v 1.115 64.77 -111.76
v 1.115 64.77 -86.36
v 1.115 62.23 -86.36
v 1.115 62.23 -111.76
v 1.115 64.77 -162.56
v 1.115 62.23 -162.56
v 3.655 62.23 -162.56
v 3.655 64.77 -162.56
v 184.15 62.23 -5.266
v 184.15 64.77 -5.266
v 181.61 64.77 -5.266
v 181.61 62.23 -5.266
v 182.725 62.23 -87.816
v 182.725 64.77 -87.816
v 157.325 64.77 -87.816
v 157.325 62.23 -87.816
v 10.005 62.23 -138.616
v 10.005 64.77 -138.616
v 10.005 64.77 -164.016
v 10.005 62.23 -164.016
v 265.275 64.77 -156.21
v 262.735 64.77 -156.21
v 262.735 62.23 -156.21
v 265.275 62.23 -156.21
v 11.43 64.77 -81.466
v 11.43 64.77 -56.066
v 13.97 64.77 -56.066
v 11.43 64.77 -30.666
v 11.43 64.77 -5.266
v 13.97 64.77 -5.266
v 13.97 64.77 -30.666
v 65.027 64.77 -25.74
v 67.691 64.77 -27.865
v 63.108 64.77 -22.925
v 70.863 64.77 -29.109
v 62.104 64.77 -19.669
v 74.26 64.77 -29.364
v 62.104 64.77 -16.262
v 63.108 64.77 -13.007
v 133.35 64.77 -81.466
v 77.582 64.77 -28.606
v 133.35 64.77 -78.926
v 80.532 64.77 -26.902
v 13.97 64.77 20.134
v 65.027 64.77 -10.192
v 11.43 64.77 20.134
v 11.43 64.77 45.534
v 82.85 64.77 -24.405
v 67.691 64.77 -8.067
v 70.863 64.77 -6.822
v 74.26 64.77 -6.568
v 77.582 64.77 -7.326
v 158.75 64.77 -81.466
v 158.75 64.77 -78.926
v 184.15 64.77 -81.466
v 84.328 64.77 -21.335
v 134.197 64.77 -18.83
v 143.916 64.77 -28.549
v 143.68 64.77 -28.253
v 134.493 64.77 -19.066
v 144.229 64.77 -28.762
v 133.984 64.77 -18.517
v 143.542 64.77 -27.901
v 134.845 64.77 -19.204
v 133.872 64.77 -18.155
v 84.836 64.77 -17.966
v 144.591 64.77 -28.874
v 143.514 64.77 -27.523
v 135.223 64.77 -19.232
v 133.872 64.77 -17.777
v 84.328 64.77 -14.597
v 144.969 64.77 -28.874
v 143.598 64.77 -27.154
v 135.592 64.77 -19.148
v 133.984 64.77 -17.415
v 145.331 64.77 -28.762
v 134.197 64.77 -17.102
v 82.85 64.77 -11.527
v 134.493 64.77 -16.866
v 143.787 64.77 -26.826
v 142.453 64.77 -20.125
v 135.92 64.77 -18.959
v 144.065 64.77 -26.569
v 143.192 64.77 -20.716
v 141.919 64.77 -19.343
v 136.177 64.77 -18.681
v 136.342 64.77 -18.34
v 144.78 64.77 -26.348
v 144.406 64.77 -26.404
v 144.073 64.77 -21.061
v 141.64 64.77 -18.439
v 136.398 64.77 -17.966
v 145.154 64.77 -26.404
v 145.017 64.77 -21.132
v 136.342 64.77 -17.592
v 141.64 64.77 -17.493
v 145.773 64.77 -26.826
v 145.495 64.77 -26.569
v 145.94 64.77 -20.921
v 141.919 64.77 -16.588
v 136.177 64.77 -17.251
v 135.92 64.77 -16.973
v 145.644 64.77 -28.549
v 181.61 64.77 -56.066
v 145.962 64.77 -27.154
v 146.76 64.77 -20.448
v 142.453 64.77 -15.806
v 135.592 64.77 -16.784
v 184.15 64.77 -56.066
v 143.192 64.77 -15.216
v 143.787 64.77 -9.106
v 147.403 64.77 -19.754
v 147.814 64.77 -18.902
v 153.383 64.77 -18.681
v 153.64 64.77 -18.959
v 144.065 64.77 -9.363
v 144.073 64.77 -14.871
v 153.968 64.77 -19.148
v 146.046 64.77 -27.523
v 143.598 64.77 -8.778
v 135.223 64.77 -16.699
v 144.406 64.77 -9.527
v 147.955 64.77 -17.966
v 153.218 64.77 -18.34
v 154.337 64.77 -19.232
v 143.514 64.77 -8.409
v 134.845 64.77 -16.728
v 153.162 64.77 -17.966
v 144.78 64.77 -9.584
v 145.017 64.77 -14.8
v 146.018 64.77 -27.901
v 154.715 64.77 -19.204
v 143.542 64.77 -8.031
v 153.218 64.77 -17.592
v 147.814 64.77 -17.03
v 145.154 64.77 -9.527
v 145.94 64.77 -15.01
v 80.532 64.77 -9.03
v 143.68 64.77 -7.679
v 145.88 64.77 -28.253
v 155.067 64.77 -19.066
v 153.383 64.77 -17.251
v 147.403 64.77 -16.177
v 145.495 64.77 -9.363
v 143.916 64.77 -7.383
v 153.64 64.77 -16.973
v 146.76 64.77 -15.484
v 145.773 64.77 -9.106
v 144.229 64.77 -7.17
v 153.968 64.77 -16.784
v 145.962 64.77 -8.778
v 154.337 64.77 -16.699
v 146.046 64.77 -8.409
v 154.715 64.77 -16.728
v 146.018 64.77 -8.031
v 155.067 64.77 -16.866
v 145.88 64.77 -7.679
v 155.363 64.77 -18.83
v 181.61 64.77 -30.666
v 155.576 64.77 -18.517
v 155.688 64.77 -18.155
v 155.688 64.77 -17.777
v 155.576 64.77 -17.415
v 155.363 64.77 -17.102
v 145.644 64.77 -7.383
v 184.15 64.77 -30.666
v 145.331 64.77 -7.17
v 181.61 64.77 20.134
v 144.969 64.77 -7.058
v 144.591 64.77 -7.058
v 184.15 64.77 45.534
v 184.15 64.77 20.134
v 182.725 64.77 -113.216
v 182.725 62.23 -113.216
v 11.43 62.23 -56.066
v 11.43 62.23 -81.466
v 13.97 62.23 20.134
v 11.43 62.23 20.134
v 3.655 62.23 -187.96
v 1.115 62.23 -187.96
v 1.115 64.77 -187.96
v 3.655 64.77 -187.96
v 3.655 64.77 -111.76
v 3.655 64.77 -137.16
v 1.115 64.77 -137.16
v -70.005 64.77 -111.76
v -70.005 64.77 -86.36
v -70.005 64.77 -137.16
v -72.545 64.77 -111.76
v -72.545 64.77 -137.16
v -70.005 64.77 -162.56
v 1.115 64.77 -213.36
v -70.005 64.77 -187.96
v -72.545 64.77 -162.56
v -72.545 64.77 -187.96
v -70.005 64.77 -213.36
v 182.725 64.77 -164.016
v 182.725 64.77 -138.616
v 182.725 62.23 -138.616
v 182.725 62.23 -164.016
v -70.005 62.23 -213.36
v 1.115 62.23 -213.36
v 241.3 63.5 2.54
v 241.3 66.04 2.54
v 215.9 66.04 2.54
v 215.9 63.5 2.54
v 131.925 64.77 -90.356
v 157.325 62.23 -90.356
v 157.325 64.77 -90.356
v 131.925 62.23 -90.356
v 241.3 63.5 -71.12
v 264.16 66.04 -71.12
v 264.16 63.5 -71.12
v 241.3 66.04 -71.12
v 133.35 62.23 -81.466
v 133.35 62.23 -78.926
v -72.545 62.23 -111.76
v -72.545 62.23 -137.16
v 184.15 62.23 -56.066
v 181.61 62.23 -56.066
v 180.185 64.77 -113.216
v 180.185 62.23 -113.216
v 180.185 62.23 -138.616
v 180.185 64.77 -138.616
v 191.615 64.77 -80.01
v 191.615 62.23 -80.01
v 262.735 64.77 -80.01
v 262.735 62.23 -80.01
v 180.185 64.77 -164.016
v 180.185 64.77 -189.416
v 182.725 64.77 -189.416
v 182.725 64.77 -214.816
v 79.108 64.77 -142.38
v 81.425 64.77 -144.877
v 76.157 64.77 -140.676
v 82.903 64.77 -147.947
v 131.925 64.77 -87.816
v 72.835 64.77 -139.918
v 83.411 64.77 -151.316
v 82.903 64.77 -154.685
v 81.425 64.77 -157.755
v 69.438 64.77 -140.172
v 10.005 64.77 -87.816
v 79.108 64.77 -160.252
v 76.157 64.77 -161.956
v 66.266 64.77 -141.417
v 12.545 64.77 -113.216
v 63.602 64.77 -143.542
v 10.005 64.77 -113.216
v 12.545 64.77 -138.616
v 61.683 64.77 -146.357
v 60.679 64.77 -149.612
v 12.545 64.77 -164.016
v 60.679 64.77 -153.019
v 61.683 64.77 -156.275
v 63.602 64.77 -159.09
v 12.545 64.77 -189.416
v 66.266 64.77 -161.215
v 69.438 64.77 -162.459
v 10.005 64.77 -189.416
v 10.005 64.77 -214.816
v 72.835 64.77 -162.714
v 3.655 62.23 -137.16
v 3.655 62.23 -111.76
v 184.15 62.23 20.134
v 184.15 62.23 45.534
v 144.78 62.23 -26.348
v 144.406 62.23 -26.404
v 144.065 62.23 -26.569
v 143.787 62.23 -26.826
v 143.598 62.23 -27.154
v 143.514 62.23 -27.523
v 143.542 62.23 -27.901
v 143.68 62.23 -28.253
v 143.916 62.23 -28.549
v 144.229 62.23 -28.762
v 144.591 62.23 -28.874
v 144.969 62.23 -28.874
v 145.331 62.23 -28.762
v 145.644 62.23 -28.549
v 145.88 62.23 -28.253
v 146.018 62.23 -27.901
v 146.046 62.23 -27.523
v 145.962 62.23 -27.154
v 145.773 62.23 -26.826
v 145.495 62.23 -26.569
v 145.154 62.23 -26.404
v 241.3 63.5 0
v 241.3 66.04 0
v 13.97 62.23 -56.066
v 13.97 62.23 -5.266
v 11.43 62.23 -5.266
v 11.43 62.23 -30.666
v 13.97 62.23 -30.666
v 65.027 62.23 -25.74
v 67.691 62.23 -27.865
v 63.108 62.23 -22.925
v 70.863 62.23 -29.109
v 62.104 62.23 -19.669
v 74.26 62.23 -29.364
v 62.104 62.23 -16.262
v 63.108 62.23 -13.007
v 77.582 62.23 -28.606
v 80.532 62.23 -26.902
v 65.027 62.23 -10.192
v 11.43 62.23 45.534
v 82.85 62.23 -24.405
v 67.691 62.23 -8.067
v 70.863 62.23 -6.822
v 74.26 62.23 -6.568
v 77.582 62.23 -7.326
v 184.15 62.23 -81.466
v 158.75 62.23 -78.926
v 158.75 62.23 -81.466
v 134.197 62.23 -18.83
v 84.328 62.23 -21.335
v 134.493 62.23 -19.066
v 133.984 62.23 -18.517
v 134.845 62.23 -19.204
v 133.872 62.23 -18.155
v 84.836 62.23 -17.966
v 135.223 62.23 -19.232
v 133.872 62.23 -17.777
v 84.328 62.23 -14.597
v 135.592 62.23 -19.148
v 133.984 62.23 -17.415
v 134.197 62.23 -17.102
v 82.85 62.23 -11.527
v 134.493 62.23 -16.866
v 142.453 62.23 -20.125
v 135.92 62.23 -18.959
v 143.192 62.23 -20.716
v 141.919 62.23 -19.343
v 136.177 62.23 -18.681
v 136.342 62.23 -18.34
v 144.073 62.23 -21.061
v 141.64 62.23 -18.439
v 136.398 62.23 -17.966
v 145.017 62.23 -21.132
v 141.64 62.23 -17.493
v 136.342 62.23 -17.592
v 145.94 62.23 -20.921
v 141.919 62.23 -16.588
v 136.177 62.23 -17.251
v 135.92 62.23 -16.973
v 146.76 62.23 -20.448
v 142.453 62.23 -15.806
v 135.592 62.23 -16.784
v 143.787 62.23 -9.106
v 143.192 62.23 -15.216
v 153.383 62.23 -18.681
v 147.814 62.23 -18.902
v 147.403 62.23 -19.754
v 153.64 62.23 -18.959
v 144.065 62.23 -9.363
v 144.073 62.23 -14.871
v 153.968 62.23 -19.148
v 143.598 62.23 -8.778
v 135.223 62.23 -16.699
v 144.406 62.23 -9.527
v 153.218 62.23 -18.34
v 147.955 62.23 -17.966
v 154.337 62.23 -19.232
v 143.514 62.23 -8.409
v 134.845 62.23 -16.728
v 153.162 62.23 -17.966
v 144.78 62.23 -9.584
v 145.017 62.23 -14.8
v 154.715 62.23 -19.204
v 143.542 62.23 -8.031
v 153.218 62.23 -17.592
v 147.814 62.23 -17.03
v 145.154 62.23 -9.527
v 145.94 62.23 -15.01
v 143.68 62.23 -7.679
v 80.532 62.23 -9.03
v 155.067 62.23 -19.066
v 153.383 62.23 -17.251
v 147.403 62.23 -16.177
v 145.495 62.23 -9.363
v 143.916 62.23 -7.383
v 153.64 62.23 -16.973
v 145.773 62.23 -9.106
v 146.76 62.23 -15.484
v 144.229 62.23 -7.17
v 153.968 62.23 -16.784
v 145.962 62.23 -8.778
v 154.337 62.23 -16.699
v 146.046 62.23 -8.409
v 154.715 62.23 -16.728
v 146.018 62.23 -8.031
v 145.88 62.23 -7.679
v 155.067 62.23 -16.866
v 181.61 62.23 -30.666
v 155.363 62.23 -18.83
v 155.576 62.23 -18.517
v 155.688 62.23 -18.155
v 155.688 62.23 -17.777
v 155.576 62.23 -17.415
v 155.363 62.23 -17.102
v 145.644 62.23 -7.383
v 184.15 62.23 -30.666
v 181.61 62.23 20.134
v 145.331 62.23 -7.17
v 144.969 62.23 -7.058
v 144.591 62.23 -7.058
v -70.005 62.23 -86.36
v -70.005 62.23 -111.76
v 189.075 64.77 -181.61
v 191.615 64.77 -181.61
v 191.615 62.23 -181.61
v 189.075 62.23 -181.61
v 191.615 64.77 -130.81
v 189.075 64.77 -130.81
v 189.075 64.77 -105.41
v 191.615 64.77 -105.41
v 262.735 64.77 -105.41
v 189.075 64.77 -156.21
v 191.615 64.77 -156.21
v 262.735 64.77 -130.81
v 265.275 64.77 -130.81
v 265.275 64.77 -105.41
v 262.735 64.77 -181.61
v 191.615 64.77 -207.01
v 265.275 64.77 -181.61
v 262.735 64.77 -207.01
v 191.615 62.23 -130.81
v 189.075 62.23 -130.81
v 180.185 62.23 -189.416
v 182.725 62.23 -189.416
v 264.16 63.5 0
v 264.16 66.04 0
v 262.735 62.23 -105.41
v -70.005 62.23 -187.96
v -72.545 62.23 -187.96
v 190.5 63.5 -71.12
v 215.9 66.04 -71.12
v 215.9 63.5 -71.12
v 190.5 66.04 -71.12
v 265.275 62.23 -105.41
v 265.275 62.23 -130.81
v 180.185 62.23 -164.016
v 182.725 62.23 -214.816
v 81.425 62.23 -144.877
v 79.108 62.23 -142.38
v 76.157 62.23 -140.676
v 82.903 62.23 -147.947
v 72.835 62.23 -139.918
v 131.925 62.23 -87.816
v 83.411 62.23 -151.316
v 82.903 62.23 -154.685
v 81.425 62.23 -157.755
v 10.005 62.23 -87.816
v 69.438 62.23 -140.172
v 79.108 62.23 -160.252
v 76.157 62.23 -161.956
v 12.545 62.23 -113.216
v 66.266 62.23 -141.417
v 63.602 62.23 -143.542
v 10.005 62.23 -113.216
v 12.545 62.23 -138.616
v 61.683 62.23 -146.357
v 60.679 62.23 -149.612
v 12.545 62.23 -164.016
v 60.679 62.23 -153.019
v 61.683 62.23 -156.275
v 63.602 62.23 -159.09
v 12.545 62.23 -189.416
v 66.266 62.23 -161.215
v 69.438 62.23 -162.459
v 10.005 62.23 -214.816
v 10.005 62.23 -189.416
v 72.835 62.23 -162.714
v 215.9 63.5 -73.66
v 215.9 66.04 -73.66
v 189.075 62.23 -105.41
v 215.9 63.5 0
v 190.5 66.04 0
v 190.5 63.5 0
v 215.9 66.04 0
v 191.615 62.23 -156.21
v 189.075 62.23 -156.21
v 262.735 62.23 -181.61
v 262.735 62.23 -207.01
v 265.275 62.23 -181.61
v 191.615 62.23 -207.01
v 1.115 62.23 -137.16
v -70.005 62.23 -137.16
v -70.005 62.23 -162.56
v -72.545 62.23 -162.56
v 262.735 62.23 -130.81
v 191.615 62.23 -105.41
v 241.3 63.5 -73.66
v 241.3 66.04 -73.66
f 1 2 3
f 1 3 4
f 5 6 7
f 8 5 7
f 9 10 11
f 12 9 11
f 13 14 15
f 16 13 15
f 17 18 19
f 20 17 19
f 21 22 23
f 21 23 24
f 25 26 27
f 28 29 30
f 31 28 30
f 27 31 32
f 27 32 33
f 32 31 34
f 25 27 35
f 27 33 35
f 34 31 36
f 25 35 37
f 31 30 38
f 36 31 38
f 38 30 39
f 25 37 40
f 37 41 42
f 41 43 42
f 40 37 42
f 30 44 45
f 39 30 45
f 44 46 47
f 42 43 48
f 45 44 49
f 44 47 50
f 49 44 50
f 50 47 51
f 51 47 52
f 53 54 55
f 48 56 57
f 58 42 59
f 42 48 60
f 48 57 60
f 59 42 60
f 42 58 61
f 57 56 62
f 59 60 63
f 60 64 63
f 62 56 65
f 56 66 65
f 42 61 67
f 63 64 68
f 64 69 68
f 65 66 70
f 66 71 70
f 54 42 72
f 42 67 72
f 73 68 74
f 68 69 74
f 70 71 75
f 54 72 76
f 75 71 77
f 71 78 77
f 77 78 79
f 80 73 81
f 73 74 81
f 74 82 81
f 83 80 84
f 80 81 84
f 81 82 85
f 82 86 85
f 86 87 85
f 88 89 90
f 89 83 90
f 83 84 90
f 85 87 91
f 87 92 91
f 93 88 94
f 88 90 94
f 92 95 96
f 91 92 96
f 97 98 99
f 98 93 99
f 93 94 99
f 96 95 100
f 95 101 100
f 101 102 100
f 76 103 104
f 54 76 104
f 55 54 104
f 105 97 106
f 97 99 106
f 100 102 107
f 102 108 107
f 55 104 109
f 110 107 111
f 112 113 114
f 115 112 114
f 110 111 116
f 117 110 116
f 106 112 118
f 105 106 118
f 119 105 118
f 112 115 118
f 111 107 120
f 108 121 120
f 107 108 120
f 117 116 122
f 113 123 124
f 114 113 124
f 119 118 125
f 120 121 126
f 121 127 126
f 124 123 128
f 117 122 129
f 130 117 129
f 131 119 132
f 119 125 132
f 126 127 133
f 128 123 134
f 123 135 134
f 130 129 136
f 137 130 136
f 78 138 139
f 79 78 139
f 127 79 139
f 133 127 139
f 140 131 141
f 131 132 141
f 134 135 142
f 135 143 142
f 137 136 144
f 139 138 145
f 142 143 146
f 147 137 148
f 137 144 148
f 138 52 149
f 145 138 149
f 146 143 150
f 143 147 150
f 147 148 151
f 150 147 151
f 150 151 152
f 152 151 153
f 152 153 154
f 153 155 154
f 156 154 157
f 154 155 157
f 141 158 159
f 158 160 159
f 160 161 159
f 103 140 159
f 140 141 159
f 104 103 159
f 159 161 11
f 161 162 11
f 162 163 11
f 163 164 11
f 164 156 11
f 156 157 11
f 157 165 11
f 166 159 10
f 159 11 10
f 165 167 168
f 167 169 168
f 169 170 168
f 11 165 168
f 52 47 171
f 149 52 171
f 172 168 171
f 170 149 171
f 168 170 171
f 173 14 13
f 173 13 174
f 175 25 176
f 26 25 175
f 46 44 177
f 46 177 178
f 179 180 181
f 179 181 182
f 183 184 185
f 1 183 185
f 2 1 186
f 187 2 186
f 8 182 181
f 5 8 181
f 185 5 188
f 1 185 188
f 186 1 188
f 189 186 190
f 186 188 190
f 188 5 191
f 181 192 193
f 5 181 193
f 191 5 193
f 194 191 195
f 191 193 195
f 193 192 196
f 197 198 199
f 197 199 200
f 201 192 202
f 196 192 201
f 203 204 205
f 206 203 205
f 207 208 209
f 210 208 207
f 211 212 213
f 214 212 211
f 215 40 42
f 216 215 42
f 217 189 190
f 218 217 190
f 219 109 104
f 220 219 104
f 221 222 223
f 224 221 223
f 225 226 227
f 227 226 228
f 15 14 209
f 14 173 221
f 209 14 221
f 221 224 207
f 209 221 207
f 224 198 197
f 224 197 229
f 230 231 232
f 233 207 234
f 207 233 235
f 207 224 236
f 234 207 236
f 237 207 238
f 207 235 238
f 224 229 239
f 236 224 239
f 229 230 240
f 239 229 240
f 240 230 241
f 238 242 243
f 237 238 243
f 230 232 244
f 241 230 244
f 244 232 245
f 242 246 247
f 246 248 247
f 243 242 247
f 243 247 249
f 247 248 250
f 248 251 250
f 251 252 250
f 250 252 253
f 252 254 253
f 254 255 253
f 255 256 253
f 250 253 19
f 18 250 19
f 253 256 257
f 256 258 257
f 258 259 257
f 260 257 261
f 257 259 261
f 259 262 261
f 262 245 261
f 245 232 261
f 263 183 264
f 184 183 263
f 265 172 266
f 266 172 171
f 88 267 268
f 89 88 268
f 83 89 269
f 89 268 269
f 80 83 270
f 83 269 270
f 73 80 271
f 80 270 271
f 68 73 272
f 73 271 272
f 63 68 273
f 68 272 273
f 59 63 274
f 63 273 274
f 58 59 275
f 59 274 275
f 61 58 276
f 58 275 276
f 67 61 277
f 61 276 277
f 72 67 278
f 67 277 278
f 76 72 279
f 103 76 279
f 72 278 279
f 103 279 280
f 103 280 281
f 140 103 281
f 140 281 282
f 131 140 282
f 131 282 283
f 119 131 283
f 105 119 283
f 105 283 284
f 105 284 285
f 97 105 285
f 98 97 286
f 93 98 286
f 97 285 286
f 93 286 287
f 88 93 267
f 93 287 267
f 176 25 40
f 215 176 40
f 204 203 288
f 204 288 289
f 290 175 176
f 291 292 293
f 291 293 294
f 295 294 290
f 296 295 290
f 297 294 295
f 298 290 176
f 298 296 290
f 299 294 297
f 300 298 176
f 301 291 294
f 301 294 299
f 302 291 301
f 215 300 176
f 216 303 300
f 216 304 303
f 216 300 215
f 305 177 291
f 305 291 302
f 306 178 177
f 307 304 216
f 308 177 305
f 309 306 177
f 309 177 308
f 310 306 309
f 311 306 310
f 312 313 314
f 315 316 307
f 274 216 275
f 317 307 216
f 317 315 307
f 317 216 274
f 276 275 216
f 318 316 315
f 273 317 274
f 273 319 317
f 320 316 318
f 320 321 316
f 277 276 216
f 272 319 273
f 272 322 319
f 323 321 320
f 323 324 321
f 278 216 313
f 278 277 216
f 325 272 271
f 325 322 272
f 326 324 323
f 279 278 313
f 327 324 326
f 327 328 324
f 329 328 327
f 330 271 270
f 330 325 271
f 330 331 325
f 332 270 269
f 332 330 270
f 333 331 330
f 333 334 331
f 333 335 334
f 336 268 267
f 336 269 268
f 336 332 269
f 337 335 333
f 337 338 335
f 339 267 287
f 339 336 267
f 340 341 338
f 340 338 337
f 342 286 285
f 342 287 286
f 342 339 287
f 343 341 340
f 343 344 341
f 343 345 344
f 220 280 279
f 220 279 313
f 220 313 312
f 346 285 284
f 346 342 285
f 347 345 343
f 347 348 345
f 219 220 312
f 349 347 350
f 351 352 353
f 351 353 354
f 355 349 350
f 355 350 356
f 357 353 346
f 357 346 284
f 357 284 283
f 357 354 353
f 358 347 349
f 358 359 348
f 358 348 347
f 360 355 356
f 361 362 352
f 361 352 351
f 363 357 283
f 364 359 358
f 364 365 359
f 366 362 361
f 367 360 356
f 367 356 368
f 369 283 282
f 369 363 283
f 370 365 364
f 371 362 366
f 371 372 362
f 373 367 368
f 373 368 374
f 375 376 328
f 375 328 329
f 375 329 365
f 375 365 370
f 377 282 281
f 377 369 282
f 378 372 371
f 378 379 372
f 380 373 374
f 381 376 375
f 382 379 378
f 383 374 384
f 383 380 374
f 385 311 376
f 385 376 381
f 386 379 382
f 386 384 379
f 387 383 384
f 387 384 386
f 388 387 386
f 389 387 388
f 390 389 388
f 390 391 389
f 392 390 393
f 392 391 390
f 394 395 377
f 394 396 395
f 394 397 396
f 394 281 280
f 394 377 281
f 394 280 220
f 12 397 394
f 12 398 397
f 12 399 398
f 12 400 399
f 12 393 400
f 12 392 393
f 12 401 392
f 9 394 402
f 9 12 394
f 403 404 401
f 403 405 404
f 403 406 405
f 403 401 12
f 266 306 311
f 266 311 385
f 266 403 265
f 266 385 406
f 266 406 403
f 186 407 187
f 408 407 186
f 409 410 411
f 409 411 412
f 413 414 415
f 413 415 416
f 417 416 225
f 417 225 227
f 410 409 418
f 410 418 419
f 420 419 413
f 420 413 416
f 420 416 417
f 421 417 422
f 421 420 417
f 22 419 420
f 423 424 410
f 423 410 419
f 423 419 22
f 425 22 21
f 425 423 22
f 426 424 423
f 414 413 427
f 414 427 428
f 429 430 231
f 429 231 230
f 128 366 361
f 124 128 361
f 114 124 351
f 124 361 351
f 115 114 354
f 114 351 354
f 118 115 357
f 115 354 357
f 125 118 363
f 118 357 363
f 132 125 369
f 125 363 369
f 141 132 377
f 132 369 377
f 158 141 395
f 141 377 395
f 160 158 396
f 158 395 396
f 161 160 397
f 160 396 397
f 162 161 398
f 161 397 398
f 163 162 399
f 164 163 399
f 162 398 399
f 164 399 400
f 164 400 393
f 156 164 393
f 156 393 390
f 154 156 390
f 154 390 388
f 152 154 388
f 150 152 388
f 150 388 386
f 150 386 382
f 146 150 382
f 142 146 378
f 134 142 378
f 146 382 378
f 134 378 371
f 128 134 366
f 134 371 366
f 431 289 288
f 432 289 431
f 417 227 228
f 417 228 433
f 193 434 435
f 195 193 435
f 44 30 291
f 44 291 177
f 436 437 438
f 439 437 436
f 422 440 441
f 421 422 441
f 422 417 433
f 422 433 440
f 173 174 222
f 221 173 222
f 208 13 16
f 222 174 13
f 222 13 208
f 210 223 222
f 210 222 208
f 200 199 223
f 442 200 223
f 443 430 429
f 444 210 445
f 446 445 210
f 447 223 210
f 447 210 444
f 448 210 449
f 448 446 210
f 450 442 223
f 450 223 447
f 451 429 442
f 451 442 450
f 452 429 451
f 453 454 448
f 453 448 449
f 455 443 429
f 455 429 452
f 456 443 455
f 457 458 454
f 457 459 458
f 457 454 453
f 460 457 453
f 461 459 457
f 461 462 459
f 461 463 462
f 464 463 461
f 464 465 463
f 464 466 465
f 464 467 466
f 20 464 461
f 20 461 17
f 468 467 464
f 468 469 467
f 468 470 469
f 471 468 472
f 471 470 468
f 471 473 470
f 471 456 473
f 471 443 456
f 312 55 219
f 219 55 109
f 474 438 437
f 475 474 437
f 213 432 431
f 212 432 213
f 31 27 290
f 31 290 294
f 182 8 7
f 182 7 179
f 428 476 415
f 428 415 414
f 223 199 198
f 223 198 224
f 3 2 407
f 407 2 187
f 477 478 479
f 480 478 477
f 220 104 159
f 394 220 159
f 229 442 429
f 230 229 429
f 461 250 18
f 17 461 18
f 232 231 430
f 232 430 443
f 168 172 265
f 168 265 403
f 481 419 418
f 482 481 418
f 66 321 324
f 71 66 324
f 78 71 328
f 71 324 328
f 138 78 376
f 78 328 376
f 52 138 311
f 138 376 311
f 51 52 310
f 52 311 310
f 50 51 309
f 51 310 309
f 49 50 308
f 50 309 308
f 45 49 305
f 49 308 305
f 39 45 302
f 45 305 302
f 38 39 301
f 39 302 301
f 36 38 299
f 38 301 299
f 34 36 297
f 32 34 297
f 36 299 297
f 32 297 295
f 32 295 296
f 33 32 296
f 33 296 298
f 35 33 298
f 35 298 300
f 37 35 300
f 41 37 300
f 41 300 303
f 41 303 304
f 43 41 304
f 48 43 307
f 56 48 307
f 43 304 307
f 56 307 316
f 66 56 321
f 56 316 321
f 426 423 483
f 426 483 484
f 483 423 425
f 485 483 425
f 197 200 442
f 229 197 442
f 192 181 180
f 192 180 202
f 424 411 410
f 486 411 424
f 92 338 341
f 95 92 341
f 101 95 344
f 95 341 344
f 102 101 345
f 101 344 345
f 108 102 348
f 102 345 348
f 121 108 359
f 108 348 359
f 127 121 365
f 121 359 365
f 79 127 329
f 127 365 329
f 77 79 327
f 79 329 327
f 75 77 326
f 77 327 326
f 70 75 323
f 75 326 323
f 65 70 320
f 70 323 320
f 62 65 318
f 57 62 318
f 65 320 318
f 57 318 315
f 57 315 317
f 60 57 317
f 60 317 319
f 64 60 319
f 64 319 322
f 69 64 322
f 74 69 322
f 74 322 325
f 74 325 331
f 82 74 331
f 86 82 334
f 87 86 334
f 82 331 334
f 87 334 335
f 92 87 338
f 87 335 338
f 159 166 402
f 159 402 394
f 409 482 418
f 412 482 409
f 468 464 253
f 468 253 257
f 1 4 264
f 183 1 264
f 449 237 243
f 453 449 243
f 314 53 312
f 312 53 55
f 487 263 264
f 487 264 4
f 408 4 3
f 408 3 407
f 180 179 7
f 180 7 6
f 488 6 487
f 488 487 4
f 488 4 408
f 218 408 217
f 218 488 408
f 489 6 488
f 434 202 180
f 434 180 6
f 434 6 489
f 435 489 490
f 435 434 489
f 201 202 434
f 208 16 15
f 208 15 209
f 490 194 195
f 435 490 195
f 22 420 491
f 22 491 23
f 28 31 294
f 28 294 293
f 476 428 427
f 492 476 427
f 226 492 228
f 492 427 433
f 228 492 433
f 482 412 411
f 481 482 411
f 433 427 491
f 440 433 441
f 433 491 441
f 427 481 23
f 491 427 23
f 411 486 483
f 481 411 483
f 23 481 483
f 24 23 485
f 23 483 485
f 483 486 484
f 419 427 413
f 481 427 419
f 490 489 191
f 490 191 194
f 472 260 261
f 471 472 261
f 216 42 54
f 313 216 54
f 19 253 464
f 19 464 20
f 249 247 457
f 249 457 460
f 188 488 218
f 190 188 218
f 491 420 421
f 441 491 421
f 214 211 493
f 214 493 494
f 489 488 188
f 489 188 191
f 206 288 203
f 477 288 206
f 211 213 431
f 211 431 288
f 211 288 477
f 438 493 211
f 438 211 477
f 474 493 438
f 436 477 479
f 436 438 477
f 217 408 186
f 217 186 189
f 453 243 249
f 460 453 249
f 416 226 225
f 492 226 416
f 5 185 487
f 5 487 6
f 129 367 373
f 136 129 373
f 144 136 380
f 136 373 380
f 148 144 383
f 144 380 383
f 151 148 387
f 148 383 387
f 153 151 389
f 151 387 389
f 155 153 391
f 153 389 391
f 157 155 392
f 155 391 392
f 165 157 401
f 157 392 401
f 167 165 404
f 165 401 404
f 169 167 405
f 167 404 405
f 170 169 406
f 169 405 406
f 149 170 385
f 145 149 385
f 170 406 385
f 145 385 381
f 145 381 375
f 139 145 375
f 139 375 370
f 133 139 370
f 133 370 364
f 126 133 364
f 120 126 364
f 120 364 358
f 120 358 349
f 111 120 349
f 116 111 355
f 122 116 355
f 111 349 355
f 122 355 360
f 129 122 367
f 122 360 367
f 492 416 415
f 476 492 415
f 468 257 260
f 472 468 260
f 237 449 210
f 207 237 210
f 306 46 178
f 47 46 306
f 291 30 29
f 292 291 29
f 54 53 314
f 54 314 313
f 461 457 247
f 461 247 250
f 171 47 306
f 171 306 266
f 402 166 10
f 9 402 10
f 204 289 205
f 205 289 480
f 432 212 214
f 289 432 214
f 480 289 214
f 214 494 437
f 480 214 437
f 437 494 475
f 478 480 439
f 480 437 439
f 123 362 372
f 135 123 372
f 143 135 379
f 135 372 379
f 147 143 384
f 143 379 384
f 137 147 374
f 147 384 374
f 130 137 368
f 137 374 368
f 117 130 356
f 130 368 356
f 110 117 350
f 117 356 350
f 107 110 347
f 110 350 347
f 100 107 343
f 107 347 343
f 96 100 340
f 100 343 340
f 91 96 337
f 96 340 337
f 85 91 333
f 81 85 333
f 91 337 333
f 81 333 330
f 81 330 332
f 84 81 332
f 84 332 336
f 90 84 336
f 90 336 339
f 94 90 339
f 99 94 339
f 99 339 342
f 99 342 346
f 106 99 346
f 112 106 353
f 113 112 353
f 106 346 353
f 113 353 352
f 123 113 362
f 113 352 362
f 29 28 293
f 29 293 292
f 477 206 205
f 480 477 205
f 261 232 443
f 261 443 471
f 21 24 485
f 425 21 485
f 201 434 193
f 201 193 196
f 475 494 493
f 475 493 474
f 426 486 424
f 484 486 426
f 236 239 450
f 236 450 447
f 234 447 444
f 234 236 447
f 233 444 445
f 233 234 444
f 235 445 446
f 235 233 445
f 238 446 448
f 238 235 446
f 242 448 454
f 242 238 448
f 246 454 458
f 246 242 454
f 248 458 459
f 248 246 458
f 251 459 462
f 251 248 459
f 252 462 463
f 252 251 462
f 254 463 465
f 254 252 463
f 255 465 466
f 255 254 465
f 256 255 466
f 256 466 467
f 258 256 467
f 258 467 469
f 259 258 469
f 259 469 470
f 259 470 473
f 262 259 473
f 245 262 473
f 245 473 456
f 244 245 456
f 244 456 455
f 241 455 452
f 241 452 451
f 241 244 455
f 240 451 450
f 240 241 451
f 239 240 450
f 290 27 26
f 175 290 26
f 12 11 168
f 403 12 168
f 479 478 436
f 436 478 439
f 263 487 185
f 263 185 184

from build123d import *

# Parameters (mm, degrees)
SKETCH1_W                = 172.72
SKETCH1_H                = 127
BOSS_EXTRUDE1_DEPTH      = 2.54
SKETCH2_W                = 2.54
SKETCH2_H                = 25.4
CUT_EXTRUDE1_DEPTH       = 215.400676305
SKETCH3_W                = 2.54
SKETCH3_H                = 25.4
CUT_EXTRUDE2_DEPTH       = 215.400676305
SKETCH11_W               = 76.2
SKETCH11_H               = 127
BOSS_EXTRUDE7_DEPTH      = 2.54
SKETCH19_W               = 2.54
SKETCH19_H               = 25.4
CUT_EXTRUDE7_DEPTH       = 2.54
SKETCH20_W               = 76.2
SKETCH20_H               = 127
BOSS_EXTRUDE8_DEPTH      = 2.54
SKETCH21_W               = 2.54
SKETCH21_H               = 25.4
CUT_EXTRUDE8_DEPTH       = 2.54
SKETCH22_W               = 2.54
SKETCH22_H               = 25.4
CUT_EXTRUDE9_DEPTH       = 227.686995657
SKETCH24_W               = 172.72
SKETCH24_H               = 127
BOSS_EXTRUDE9_DEPTH      = 2.54
SKETCH25_W               = 2.54
SKETCH25_H               = 25.4
CUT_EXTRUDE11_DEPTH      = 2.54
SKETCH28_W               = 76.2
SKETCH28_H               = 76.2
BOSS_EXTRUDE10_DEPTH     = 2.54
SKETCH29_W               = 25.4
SKETCH29_H               = 2.54
CUT_EXTRUDE12_DEPTH      = 2.54
SKETCH30_W               = 25.4
SKETCH30_H               = 2.54
CUT_EXTRUDE13_DEPTH      = 2.54
CUT_EXTRUDE14_DEPTH      = 228.525028074
CUT_EXTRUDE14_DEPTH_BACK = 228.525028074
SKETCH31_W               = 25.4
SKETCH31_H               = 2.54
SKETCH32_W               = 25.4
SKETCH32_H               = 2.54
CUT_EXTRUDE15_DEPTH      = 228.525028074
SKETCH35_W               = 71.12
SKETCH35_H               = 2.54
CUT_EXTRUDE16_DEPTH      = 2.54
SKETCH36_R               = 11.43
CUT_EXTRUDE17_DEPTH      = 2.54
SKETCH37_R               = 3.175
CUT_EXTRUDE18_DEPTH      = 2.54
SKETCH38_R               = 1.27
CUT_EXTRUDE19_DEPTH      = 2.54
CIRPATTERN1_COUNT        = 4
CUT_EXTRUDE20_START      = -2.54
SKETCH44_R               = 11.43
CUT_EXTRUDE20_DEPTH      = 2.54
BODY_MOVE_COPY31_ANGLE   = 90
BODY_MOVE_COPY33_ANGLE   = 90
BODY_MOVE_COPY35_ANGLE   = 90
BODY_MOVE_COPY36_ANGLE   = 90
BODY_MOVE_COPY39_ANGLE   = 90
BODY_MOVE_COPY41_ANGLE   = 90


with BuildPart() as part:
    # Sketch1 → Boss-Extrude1 (new body)
    with BuildSketch(Plane.XY):
        with Locations((86.36, 63.5)):
            Rectangle(SKETCH1_W, SKETCH1_H)
    extrude(amount=BOSS_EXTRUDE1_DEPTH)

    # Sketch2 → Cut-Extrude1 (cut, through all)
    with BuildSketch(Plane(origin=(0, 0, 0), x_dir=(-1, 0, 0), z_dir=(0, 0, -1))):
        with Locations((-171.45, 88.9)):
            Rectangle(SKETCH2_W, SKETCH2_H)
        with Locations((-171.45, 38.1)):
            Rectangle(SKETCH2_W, SKETCH2_H)
    extrude(amount=-CUT_EXTRUDE1_DEPTH, mode=Mode.SUBTRACT)

    # Sketch3 → Cut-Extrude2 (cut, through all)
    with BuildSketch(Plane(origin=(0, 0, 0), x_dir=(-1, 0, 0), z_dir=(0, 0, -1))):
        with Locations((-1.27, 88.9)):
            Rectangle(SKETCH3_W, SKETCH3_H)
        with Locations((-1.27, 38.1)):
            Rectangle(SKETCH3_W, SKETCH3_H)
    extrude(amount=-CUT_EXTRUDE2_DEPTH, mode=Mode.SUBTRACT)

    # Sketch31 → Cut-Extrude14 (cut, two sides: drawn at the far end of the back side and taken through both)
    with BuildSketch(Plane.XY.offset(2.54).offset(-CUT_EXTRUDE14_DEPTH_BACK)):
        with Locations((134.62, 1.27)):
            Rectangle(SKETCH31_W, SKETCH31_H)
    extrude(amount=CUT_EXTRUDE14_DEPTH + CUT_EXTRUDE14_DEPTH_BACK, mode=Mode.SUBTRACT)

    # Sketch36 → Cut-Extrude17 (cut)
    with BuildSketch(Plane.XY.offset(2.54)):
        with Locations((61.976, 63.5)):
            Circle(SKETCH36_R)
    extrude(amount=-CUT_EXTRUDE17_DEPTH, mode=Mode.SUBTRACT)

    # Sketch37 → Cut-Extrude18 (cut)
    with BuildSketch(Plane.XY.offset(2.54)):
        with Locations((133.35, 63.5)):
            Circle(SKETCH37_R)
    extrude(amount=-CUT_EXTRUDE18_DEPTH, mode=Mode.SUBTRACT)

    # Sketch38 → Cut-Extrude19 (cut)
    with BuildSketch(Plane.XY.offset(2.54)):
        with Locations((123.698, 63.5)):
            Circle(SKETCH38_R)
    cut_extrude19 = extrude(amount=-CUT_EXTRUDE19_DEPTH, mode=Mode.SUBTRACT)

    # CirPattern1: Cut-Extrude19 ×4 about axis
    cirpattern1_axis = Axis((133.35, 63.5, 0), (0, 0, 1))
    for i in range(1, CIRPATTERN1_COUNT):
        add(cut_extrude19.rotate(cirpattern1_axis, i * 360 / CIRPATTERN1_COUNT), mode=Mode.SUBTRACT)


with BuildPart() as body_2:
    # Sketch11 → Boss-Extrude7 (new body)
    with BuildSketch(Plane.ZY):
        with Locations((-35.56, 63.5)):
            Rectangle(SKETCH11_W, SKETCH11_H)
    extrude(amount=BOSS_EXTRUDE7_DEPTH)

    # Sketch19 → Cut-Extrude7 (cut)
    with BuildSketch(Plane.ZY.offset(2.54)):
        with Locations((1.27, 114.3)):
            Rectangle(SKETCH19_W, SKETCH19_H)
        with Locations((1.27, 63.5)):
            Rectangle(SKETCH19_W, SKETCH19_H)
        with Locations((1.27, 12.7)):
            Rectangle(SKETCH19_W, SKETCH19_H)
    extrude(amount=-CUT_EXTRUDE7_DEPTH, mode=Mode.SUBTRACT)


with BuildPart() as body_2_1:
    # Body-Move/Copy1: read off the stored shape, not the designer's step
    # Body-Move/Copy1: moved
    add(body_2.part.moved(Location((172.72, 0, 0))))


with BuildPart() as body_3:
    # Sketch20 → Boss-Extrude8 (new body)
    with BuildSketch(Plane.ZY):
        with Locations((-35.56, 63.5)):
            Rectangle(SKETCH20_W, SKETCH20_H)
    extrude(amount=BOSS_EXTRUDE8_DEPTH)

    # Sketch21 → Cut-Extrude8 (cut)
    with BuildSketch(Plane.ZY.offset(2.54)):
        with Locations((1.27, 114.3)):
            Rectangle(SKETCH21_W, SKETCH21_H)
        with Locations((1.27, 63.5)):
            Rectangle(SKETCH21_W, SKETCH21_H)
        with Locations((1.27, 12.7)):
            Rectangle(SKETCH21_W, SKETCH21_H)
    extrude(amount=-CUT_EXTRUDE8_DEPTH, mode=Mode.SUBTRACT)


with BuildPart() as body_3_1:
    # Body-Move/Copy2: read off the stored shape, not the designer's step
    # Body-Move/Copy2: moved
    add(body_3.part.moved(Location((2.54, 0, 0))))


with BuildPart() as cut_extrude9_tool:
    # Sketch22 → Cut-Extrude9 (new, through all)
    with BuildSketch(Plane(origin=(172.72, 0, 0), x_dir=(0, 0, -1), z_dir=(1, 0, 0))):
        with Locations((72.39, 114.3)):
            Rectangle(SKETCH22_W, SKETCH22_H)
        with Locations((72.39, 63.5)):
            Rectangle(SKETCH22_W, SKETCH22_H)
        with Locations((72.39, 12.7)):
            Rectangle(SKETCH22_W, SKETCH22_H)
    extrude(amount=-CUT_EXTRUDE9_DEPTH)


with BuildPart() as body_2_2:
    add(body_2_1.part)

    # Cut-Extrude9: cut by cut_extrude9_tool
    add(cut_extrude9_tool.part, mode=Mode.SUBTRACT)


with BuildPart() as body_3_2:
    add(body_3_1.part)

    # Cut-Extrude9: cut by cut_extrude9_tool
    add(cut_extrude9_tool.part, mode=Mode.SUBTRACT)


with BuildPart() as body_4:
    # Sketch24 → Boss-Extrude9 (new body)
    with BuildSketch(Plane(origin=(0, 0, -73.66), x_dir=(-1, 0, 0), z_dir=(0, 0, -1))):
        with Locations((-86.36, 38.1)):
            Rectangle(SKETCH24_W, SKETCH24_H)
    extrude(amount=BOSS_EXTRUDE9_DEPTH)

    # Sketch25 → Cut-Extrude11 (cut)
    with BuildSketch(Plane(origin=(0, 0, -76.2), x_dir=(-1, 0, 0), z_dir=(0, 0, -1))):
        with Locations((-171.45, 12.7)):
            Rectangle(SKETCH25_W, SKETCH25_H)
        with Locations((-171.45, 63.5)):
            Rectangle(SKETCH25_W, SKETCH25_H)
        with Locations((-1.27, 63.5)):
            Rectangle(SKETCH25_W, SKETCH25_H)
        with Locations((-1.27, 12.7)):
            Rectangle(SKETCH25_W, SKETCH25_H)
    extrude(amount=-CUT_EXTRUDE11_DEPTH, mode=Mode.SUBTRACT)


with BuildPart() as body_4_1:
    # Body-Move/Copy4: read off the stored shape, not the designer's step
    # Body-Move/Copy4: moved
    add(body_4.part.moved(Location((0, 25.4, 0))))


with BuildPart() as body_4_2:
    # Body-Move/Copy5: read off the stored shape, not the designer's step
    # Body-Move/Copy5: moved
    add(body_4_1.part.moved(Location((0, 0, 2.54))))

    # Sketch32 → Cut-Extrude15 (cut, through all)
    with BuildSketch(Plane(origin=(0, 0, -73.66), x_dir=(-1, 0, 0), z_dir=(0, 0, -1))):
        with Locations((-134.62, 1.27)):
            Rectangle(SKETCH32_W, SKETCH32_H)
    extrude(amount=-CUT_EXTRUDE15_DEPTH, mode=Mode.SUBTRACT)

    # Sketch44 → Cut-Extrude20 (cut)
    with BuildSketch(Plane(origin=(0, 0, -73.66), x_dir=(-1, 0, 0), z_dir=(0, 0, -1)).offset(CUT_EXTRUDE20_START)):
        with Locations(Location((-61.976, 63.5, 0), (0, 0, 180))):
            Circle(SKETCH44_R)
    extrude(amount=CUT_EXTRUDE20_DEPTH, mode=Mode.SUBTRACT)


with BuildPart() as body_5:
    # Sketch28 → Boss-Extrude10 (new body)
    with BuildSketch(Plane(origin=(0, 0, 0), x_dir=(-1, 0, 0), z_dir=(0, -1, 0))):
        with Locations((-134.62, 35.56)):
            Rectangle(SKETCH28_W, SKETCH28_H)
    extrude(amount=BOSS_EXTRUDE10_DEPTH)

    # Sketch29 → Cut-Extrude12 (cut)
    with BuildSketch(Plane(origin=(0, 0, -73.66), x_dir=(-1, 0, 0), z_dir=(0, 0, -1))):
        with Locations((-160.02, -1.27)):
            Rectangle(SKETCH29_W, SKETCH29_H)
        with Locations((-109.22, -1.27)):
            Rectangle(SKETCH29_W, SKETCH29_H)
    extrude(amount=-CUT_EXTRUDE12_DEPTH, mode=Mode.SUBTRACT)

    # Sketch30 → Cut-Extrude13 (cut)
    with BuildSketch(Plane.XY.offset(2.54)):
        with Locations((109.22, -1.27)):
            Rectangle(SKETCH30_W, SKETCH30_H)
        with Locations((160.02, -1.27)):
            Rectangle(SKETCH30_W, SKETCH30_H)
    extrude(amount=-CUT_EXTRUDE13_DEPTH, mode=Mode.SUBTRACT)

    # Sketch35 → Cut-Extrude16 (cut)
    with BuildSketch(Plane(origin=(172.72, 0, 0), x_dir=(0, 0, -1), z_dir=(1, 0, 0))):
        with Locations((35.56, -1.27)):
            Rectangle(SKETCH35_W, SKETCH35_H)
    extrude(amount=-CUT_EXTRUDE16_DEPTH, mode=Mode.SUBTRACT)


with BuildPart() as body_5_1:
    # Body-Move/Copy6: read off the stored shape, not the designer's step
    # Body-Move/Copy6: moved
    add(body_5.part.moved(Location((0, 2.54, 0))))


with BuildPart() as body_4_3:
    # Body-Move/Copy31: moved
    add(body_4_2.part.rotate(Axis((0, 63.5, -72.39), (-1, 0, 0)), BODY_MOVE_COPY31_ANGLE))


with BuildPart() as body_4_4:
    # Body-Move/Copy32: moved
    add(body_4_3.part.moved(Location((0, 0, -78.925918228))))


with BuildPart() as part_1:
    # Body-Move/Copy33: moved
    add(part.part.rotate(Axis((0, 63.5, 1.27), (1, 0, 0)), BODY_MOVE_COPY33_ANGLE))


with BuildPart() as part_2:
    # Body-Move/Copy34: moved
    add(part_1.part.moved(Location((0, 0, 72.561038444))))


with BuildPart() as body_3_3:
    # Body-Move/Copy35: moved
    add(body_3_2.part.rotate(Axis((1.27, 63.5, 0), (0, 0, 1)), BODY_MOVE_COPY35_ANGLE))


with BuildPart() as body_2_3:
    # Body-Move/Copy36: moved
    add(body_2_2.part.rotate(Axis((171.45, 63.5, 0), (0, 0, -1)), BODY_MOVE_COPY36_ANGLE))


with BuildPart() as body_2_4:
    # Body-Move/Copy37: moved
    add(body_2_3.part.moved(Location((81.125082832, 0, 0))))


with BuildPart() as body_5_2:
    # Body-Move/Copy38: moved
    add(body_5_1.part.moved(Location((0, 63.5, 0))))


with BuildPart() as body_3_4:
    # Body-Move/Copy39: moved
    add(body_3_3.part.rotate(Axis((1.27, 0, -35.56), (0, -1, 0)), BODY_MOVE_COPY39_ANGLE))


with BuildPart() as body_3_5:
    # Body-Move/Copy40: moved
    add(body_3_4.part.moved(Location((-50.8, 0, -114.3))))


with BuildPart() as body_2_5:
    # Body-Move/Copy41: moved
    add(body_2_4.part.rotate(Axis((252.575082832, 0, -35.56), (0, 1, 0)), BODY_MOVE_COPY41_ANGLE))


with BuildPart() as body_2_6:
    # Body-Move/Copy42: moved
    add(body_2_5.part.moved(Location((-25.4, 0, -114.3))))


with BuildPart() as body_5_3:
    # Body-Move/Copy43: moved
    add(body_5_2.part.moved(Location((93.98, 0, 0))))


with BuildPart() as part_3:
    # Body-Move/Copy44: moved
    add(part_2.part.moved(Location((0, 0, -81.28))))


with BuildPart() as part_4:
    # Body-Move/Copy45: read off the stored shape, not the designer's step
    # Body-Move/Copy45: moved
    add(part_3.part.moved(Location((11.43, 0, -10.5169567))))


with BuildPart() as body_4_5:
    # Body-Move/Copy46: read off the stored shape, not the designer's step
    # Body-Move/Copy46: moved
    add(body_4_4.part.moved(Location((10.0050828, 0, 0))))


with BuildPart() as body_2_7:
    # Body-Move/Copy47: read off the stored shape, not the designer's step
    # Body-Move/Copy47: moved
    add(body_2_6.part.moved(Location((0, 0, 6.35))))


with BuildPart() as body_3_6:
    # Body-Move/Copy48: read off the stored shape, not the designer's step
    # Body-Move/Copy48: moved
    add(body_3_5.part.moved(Location((15.0850828, 0, 0))))


solid = Compound([body_5_3.part, part_4.part, body_4_5.part, body_2_7.part, body_3_6.part])
